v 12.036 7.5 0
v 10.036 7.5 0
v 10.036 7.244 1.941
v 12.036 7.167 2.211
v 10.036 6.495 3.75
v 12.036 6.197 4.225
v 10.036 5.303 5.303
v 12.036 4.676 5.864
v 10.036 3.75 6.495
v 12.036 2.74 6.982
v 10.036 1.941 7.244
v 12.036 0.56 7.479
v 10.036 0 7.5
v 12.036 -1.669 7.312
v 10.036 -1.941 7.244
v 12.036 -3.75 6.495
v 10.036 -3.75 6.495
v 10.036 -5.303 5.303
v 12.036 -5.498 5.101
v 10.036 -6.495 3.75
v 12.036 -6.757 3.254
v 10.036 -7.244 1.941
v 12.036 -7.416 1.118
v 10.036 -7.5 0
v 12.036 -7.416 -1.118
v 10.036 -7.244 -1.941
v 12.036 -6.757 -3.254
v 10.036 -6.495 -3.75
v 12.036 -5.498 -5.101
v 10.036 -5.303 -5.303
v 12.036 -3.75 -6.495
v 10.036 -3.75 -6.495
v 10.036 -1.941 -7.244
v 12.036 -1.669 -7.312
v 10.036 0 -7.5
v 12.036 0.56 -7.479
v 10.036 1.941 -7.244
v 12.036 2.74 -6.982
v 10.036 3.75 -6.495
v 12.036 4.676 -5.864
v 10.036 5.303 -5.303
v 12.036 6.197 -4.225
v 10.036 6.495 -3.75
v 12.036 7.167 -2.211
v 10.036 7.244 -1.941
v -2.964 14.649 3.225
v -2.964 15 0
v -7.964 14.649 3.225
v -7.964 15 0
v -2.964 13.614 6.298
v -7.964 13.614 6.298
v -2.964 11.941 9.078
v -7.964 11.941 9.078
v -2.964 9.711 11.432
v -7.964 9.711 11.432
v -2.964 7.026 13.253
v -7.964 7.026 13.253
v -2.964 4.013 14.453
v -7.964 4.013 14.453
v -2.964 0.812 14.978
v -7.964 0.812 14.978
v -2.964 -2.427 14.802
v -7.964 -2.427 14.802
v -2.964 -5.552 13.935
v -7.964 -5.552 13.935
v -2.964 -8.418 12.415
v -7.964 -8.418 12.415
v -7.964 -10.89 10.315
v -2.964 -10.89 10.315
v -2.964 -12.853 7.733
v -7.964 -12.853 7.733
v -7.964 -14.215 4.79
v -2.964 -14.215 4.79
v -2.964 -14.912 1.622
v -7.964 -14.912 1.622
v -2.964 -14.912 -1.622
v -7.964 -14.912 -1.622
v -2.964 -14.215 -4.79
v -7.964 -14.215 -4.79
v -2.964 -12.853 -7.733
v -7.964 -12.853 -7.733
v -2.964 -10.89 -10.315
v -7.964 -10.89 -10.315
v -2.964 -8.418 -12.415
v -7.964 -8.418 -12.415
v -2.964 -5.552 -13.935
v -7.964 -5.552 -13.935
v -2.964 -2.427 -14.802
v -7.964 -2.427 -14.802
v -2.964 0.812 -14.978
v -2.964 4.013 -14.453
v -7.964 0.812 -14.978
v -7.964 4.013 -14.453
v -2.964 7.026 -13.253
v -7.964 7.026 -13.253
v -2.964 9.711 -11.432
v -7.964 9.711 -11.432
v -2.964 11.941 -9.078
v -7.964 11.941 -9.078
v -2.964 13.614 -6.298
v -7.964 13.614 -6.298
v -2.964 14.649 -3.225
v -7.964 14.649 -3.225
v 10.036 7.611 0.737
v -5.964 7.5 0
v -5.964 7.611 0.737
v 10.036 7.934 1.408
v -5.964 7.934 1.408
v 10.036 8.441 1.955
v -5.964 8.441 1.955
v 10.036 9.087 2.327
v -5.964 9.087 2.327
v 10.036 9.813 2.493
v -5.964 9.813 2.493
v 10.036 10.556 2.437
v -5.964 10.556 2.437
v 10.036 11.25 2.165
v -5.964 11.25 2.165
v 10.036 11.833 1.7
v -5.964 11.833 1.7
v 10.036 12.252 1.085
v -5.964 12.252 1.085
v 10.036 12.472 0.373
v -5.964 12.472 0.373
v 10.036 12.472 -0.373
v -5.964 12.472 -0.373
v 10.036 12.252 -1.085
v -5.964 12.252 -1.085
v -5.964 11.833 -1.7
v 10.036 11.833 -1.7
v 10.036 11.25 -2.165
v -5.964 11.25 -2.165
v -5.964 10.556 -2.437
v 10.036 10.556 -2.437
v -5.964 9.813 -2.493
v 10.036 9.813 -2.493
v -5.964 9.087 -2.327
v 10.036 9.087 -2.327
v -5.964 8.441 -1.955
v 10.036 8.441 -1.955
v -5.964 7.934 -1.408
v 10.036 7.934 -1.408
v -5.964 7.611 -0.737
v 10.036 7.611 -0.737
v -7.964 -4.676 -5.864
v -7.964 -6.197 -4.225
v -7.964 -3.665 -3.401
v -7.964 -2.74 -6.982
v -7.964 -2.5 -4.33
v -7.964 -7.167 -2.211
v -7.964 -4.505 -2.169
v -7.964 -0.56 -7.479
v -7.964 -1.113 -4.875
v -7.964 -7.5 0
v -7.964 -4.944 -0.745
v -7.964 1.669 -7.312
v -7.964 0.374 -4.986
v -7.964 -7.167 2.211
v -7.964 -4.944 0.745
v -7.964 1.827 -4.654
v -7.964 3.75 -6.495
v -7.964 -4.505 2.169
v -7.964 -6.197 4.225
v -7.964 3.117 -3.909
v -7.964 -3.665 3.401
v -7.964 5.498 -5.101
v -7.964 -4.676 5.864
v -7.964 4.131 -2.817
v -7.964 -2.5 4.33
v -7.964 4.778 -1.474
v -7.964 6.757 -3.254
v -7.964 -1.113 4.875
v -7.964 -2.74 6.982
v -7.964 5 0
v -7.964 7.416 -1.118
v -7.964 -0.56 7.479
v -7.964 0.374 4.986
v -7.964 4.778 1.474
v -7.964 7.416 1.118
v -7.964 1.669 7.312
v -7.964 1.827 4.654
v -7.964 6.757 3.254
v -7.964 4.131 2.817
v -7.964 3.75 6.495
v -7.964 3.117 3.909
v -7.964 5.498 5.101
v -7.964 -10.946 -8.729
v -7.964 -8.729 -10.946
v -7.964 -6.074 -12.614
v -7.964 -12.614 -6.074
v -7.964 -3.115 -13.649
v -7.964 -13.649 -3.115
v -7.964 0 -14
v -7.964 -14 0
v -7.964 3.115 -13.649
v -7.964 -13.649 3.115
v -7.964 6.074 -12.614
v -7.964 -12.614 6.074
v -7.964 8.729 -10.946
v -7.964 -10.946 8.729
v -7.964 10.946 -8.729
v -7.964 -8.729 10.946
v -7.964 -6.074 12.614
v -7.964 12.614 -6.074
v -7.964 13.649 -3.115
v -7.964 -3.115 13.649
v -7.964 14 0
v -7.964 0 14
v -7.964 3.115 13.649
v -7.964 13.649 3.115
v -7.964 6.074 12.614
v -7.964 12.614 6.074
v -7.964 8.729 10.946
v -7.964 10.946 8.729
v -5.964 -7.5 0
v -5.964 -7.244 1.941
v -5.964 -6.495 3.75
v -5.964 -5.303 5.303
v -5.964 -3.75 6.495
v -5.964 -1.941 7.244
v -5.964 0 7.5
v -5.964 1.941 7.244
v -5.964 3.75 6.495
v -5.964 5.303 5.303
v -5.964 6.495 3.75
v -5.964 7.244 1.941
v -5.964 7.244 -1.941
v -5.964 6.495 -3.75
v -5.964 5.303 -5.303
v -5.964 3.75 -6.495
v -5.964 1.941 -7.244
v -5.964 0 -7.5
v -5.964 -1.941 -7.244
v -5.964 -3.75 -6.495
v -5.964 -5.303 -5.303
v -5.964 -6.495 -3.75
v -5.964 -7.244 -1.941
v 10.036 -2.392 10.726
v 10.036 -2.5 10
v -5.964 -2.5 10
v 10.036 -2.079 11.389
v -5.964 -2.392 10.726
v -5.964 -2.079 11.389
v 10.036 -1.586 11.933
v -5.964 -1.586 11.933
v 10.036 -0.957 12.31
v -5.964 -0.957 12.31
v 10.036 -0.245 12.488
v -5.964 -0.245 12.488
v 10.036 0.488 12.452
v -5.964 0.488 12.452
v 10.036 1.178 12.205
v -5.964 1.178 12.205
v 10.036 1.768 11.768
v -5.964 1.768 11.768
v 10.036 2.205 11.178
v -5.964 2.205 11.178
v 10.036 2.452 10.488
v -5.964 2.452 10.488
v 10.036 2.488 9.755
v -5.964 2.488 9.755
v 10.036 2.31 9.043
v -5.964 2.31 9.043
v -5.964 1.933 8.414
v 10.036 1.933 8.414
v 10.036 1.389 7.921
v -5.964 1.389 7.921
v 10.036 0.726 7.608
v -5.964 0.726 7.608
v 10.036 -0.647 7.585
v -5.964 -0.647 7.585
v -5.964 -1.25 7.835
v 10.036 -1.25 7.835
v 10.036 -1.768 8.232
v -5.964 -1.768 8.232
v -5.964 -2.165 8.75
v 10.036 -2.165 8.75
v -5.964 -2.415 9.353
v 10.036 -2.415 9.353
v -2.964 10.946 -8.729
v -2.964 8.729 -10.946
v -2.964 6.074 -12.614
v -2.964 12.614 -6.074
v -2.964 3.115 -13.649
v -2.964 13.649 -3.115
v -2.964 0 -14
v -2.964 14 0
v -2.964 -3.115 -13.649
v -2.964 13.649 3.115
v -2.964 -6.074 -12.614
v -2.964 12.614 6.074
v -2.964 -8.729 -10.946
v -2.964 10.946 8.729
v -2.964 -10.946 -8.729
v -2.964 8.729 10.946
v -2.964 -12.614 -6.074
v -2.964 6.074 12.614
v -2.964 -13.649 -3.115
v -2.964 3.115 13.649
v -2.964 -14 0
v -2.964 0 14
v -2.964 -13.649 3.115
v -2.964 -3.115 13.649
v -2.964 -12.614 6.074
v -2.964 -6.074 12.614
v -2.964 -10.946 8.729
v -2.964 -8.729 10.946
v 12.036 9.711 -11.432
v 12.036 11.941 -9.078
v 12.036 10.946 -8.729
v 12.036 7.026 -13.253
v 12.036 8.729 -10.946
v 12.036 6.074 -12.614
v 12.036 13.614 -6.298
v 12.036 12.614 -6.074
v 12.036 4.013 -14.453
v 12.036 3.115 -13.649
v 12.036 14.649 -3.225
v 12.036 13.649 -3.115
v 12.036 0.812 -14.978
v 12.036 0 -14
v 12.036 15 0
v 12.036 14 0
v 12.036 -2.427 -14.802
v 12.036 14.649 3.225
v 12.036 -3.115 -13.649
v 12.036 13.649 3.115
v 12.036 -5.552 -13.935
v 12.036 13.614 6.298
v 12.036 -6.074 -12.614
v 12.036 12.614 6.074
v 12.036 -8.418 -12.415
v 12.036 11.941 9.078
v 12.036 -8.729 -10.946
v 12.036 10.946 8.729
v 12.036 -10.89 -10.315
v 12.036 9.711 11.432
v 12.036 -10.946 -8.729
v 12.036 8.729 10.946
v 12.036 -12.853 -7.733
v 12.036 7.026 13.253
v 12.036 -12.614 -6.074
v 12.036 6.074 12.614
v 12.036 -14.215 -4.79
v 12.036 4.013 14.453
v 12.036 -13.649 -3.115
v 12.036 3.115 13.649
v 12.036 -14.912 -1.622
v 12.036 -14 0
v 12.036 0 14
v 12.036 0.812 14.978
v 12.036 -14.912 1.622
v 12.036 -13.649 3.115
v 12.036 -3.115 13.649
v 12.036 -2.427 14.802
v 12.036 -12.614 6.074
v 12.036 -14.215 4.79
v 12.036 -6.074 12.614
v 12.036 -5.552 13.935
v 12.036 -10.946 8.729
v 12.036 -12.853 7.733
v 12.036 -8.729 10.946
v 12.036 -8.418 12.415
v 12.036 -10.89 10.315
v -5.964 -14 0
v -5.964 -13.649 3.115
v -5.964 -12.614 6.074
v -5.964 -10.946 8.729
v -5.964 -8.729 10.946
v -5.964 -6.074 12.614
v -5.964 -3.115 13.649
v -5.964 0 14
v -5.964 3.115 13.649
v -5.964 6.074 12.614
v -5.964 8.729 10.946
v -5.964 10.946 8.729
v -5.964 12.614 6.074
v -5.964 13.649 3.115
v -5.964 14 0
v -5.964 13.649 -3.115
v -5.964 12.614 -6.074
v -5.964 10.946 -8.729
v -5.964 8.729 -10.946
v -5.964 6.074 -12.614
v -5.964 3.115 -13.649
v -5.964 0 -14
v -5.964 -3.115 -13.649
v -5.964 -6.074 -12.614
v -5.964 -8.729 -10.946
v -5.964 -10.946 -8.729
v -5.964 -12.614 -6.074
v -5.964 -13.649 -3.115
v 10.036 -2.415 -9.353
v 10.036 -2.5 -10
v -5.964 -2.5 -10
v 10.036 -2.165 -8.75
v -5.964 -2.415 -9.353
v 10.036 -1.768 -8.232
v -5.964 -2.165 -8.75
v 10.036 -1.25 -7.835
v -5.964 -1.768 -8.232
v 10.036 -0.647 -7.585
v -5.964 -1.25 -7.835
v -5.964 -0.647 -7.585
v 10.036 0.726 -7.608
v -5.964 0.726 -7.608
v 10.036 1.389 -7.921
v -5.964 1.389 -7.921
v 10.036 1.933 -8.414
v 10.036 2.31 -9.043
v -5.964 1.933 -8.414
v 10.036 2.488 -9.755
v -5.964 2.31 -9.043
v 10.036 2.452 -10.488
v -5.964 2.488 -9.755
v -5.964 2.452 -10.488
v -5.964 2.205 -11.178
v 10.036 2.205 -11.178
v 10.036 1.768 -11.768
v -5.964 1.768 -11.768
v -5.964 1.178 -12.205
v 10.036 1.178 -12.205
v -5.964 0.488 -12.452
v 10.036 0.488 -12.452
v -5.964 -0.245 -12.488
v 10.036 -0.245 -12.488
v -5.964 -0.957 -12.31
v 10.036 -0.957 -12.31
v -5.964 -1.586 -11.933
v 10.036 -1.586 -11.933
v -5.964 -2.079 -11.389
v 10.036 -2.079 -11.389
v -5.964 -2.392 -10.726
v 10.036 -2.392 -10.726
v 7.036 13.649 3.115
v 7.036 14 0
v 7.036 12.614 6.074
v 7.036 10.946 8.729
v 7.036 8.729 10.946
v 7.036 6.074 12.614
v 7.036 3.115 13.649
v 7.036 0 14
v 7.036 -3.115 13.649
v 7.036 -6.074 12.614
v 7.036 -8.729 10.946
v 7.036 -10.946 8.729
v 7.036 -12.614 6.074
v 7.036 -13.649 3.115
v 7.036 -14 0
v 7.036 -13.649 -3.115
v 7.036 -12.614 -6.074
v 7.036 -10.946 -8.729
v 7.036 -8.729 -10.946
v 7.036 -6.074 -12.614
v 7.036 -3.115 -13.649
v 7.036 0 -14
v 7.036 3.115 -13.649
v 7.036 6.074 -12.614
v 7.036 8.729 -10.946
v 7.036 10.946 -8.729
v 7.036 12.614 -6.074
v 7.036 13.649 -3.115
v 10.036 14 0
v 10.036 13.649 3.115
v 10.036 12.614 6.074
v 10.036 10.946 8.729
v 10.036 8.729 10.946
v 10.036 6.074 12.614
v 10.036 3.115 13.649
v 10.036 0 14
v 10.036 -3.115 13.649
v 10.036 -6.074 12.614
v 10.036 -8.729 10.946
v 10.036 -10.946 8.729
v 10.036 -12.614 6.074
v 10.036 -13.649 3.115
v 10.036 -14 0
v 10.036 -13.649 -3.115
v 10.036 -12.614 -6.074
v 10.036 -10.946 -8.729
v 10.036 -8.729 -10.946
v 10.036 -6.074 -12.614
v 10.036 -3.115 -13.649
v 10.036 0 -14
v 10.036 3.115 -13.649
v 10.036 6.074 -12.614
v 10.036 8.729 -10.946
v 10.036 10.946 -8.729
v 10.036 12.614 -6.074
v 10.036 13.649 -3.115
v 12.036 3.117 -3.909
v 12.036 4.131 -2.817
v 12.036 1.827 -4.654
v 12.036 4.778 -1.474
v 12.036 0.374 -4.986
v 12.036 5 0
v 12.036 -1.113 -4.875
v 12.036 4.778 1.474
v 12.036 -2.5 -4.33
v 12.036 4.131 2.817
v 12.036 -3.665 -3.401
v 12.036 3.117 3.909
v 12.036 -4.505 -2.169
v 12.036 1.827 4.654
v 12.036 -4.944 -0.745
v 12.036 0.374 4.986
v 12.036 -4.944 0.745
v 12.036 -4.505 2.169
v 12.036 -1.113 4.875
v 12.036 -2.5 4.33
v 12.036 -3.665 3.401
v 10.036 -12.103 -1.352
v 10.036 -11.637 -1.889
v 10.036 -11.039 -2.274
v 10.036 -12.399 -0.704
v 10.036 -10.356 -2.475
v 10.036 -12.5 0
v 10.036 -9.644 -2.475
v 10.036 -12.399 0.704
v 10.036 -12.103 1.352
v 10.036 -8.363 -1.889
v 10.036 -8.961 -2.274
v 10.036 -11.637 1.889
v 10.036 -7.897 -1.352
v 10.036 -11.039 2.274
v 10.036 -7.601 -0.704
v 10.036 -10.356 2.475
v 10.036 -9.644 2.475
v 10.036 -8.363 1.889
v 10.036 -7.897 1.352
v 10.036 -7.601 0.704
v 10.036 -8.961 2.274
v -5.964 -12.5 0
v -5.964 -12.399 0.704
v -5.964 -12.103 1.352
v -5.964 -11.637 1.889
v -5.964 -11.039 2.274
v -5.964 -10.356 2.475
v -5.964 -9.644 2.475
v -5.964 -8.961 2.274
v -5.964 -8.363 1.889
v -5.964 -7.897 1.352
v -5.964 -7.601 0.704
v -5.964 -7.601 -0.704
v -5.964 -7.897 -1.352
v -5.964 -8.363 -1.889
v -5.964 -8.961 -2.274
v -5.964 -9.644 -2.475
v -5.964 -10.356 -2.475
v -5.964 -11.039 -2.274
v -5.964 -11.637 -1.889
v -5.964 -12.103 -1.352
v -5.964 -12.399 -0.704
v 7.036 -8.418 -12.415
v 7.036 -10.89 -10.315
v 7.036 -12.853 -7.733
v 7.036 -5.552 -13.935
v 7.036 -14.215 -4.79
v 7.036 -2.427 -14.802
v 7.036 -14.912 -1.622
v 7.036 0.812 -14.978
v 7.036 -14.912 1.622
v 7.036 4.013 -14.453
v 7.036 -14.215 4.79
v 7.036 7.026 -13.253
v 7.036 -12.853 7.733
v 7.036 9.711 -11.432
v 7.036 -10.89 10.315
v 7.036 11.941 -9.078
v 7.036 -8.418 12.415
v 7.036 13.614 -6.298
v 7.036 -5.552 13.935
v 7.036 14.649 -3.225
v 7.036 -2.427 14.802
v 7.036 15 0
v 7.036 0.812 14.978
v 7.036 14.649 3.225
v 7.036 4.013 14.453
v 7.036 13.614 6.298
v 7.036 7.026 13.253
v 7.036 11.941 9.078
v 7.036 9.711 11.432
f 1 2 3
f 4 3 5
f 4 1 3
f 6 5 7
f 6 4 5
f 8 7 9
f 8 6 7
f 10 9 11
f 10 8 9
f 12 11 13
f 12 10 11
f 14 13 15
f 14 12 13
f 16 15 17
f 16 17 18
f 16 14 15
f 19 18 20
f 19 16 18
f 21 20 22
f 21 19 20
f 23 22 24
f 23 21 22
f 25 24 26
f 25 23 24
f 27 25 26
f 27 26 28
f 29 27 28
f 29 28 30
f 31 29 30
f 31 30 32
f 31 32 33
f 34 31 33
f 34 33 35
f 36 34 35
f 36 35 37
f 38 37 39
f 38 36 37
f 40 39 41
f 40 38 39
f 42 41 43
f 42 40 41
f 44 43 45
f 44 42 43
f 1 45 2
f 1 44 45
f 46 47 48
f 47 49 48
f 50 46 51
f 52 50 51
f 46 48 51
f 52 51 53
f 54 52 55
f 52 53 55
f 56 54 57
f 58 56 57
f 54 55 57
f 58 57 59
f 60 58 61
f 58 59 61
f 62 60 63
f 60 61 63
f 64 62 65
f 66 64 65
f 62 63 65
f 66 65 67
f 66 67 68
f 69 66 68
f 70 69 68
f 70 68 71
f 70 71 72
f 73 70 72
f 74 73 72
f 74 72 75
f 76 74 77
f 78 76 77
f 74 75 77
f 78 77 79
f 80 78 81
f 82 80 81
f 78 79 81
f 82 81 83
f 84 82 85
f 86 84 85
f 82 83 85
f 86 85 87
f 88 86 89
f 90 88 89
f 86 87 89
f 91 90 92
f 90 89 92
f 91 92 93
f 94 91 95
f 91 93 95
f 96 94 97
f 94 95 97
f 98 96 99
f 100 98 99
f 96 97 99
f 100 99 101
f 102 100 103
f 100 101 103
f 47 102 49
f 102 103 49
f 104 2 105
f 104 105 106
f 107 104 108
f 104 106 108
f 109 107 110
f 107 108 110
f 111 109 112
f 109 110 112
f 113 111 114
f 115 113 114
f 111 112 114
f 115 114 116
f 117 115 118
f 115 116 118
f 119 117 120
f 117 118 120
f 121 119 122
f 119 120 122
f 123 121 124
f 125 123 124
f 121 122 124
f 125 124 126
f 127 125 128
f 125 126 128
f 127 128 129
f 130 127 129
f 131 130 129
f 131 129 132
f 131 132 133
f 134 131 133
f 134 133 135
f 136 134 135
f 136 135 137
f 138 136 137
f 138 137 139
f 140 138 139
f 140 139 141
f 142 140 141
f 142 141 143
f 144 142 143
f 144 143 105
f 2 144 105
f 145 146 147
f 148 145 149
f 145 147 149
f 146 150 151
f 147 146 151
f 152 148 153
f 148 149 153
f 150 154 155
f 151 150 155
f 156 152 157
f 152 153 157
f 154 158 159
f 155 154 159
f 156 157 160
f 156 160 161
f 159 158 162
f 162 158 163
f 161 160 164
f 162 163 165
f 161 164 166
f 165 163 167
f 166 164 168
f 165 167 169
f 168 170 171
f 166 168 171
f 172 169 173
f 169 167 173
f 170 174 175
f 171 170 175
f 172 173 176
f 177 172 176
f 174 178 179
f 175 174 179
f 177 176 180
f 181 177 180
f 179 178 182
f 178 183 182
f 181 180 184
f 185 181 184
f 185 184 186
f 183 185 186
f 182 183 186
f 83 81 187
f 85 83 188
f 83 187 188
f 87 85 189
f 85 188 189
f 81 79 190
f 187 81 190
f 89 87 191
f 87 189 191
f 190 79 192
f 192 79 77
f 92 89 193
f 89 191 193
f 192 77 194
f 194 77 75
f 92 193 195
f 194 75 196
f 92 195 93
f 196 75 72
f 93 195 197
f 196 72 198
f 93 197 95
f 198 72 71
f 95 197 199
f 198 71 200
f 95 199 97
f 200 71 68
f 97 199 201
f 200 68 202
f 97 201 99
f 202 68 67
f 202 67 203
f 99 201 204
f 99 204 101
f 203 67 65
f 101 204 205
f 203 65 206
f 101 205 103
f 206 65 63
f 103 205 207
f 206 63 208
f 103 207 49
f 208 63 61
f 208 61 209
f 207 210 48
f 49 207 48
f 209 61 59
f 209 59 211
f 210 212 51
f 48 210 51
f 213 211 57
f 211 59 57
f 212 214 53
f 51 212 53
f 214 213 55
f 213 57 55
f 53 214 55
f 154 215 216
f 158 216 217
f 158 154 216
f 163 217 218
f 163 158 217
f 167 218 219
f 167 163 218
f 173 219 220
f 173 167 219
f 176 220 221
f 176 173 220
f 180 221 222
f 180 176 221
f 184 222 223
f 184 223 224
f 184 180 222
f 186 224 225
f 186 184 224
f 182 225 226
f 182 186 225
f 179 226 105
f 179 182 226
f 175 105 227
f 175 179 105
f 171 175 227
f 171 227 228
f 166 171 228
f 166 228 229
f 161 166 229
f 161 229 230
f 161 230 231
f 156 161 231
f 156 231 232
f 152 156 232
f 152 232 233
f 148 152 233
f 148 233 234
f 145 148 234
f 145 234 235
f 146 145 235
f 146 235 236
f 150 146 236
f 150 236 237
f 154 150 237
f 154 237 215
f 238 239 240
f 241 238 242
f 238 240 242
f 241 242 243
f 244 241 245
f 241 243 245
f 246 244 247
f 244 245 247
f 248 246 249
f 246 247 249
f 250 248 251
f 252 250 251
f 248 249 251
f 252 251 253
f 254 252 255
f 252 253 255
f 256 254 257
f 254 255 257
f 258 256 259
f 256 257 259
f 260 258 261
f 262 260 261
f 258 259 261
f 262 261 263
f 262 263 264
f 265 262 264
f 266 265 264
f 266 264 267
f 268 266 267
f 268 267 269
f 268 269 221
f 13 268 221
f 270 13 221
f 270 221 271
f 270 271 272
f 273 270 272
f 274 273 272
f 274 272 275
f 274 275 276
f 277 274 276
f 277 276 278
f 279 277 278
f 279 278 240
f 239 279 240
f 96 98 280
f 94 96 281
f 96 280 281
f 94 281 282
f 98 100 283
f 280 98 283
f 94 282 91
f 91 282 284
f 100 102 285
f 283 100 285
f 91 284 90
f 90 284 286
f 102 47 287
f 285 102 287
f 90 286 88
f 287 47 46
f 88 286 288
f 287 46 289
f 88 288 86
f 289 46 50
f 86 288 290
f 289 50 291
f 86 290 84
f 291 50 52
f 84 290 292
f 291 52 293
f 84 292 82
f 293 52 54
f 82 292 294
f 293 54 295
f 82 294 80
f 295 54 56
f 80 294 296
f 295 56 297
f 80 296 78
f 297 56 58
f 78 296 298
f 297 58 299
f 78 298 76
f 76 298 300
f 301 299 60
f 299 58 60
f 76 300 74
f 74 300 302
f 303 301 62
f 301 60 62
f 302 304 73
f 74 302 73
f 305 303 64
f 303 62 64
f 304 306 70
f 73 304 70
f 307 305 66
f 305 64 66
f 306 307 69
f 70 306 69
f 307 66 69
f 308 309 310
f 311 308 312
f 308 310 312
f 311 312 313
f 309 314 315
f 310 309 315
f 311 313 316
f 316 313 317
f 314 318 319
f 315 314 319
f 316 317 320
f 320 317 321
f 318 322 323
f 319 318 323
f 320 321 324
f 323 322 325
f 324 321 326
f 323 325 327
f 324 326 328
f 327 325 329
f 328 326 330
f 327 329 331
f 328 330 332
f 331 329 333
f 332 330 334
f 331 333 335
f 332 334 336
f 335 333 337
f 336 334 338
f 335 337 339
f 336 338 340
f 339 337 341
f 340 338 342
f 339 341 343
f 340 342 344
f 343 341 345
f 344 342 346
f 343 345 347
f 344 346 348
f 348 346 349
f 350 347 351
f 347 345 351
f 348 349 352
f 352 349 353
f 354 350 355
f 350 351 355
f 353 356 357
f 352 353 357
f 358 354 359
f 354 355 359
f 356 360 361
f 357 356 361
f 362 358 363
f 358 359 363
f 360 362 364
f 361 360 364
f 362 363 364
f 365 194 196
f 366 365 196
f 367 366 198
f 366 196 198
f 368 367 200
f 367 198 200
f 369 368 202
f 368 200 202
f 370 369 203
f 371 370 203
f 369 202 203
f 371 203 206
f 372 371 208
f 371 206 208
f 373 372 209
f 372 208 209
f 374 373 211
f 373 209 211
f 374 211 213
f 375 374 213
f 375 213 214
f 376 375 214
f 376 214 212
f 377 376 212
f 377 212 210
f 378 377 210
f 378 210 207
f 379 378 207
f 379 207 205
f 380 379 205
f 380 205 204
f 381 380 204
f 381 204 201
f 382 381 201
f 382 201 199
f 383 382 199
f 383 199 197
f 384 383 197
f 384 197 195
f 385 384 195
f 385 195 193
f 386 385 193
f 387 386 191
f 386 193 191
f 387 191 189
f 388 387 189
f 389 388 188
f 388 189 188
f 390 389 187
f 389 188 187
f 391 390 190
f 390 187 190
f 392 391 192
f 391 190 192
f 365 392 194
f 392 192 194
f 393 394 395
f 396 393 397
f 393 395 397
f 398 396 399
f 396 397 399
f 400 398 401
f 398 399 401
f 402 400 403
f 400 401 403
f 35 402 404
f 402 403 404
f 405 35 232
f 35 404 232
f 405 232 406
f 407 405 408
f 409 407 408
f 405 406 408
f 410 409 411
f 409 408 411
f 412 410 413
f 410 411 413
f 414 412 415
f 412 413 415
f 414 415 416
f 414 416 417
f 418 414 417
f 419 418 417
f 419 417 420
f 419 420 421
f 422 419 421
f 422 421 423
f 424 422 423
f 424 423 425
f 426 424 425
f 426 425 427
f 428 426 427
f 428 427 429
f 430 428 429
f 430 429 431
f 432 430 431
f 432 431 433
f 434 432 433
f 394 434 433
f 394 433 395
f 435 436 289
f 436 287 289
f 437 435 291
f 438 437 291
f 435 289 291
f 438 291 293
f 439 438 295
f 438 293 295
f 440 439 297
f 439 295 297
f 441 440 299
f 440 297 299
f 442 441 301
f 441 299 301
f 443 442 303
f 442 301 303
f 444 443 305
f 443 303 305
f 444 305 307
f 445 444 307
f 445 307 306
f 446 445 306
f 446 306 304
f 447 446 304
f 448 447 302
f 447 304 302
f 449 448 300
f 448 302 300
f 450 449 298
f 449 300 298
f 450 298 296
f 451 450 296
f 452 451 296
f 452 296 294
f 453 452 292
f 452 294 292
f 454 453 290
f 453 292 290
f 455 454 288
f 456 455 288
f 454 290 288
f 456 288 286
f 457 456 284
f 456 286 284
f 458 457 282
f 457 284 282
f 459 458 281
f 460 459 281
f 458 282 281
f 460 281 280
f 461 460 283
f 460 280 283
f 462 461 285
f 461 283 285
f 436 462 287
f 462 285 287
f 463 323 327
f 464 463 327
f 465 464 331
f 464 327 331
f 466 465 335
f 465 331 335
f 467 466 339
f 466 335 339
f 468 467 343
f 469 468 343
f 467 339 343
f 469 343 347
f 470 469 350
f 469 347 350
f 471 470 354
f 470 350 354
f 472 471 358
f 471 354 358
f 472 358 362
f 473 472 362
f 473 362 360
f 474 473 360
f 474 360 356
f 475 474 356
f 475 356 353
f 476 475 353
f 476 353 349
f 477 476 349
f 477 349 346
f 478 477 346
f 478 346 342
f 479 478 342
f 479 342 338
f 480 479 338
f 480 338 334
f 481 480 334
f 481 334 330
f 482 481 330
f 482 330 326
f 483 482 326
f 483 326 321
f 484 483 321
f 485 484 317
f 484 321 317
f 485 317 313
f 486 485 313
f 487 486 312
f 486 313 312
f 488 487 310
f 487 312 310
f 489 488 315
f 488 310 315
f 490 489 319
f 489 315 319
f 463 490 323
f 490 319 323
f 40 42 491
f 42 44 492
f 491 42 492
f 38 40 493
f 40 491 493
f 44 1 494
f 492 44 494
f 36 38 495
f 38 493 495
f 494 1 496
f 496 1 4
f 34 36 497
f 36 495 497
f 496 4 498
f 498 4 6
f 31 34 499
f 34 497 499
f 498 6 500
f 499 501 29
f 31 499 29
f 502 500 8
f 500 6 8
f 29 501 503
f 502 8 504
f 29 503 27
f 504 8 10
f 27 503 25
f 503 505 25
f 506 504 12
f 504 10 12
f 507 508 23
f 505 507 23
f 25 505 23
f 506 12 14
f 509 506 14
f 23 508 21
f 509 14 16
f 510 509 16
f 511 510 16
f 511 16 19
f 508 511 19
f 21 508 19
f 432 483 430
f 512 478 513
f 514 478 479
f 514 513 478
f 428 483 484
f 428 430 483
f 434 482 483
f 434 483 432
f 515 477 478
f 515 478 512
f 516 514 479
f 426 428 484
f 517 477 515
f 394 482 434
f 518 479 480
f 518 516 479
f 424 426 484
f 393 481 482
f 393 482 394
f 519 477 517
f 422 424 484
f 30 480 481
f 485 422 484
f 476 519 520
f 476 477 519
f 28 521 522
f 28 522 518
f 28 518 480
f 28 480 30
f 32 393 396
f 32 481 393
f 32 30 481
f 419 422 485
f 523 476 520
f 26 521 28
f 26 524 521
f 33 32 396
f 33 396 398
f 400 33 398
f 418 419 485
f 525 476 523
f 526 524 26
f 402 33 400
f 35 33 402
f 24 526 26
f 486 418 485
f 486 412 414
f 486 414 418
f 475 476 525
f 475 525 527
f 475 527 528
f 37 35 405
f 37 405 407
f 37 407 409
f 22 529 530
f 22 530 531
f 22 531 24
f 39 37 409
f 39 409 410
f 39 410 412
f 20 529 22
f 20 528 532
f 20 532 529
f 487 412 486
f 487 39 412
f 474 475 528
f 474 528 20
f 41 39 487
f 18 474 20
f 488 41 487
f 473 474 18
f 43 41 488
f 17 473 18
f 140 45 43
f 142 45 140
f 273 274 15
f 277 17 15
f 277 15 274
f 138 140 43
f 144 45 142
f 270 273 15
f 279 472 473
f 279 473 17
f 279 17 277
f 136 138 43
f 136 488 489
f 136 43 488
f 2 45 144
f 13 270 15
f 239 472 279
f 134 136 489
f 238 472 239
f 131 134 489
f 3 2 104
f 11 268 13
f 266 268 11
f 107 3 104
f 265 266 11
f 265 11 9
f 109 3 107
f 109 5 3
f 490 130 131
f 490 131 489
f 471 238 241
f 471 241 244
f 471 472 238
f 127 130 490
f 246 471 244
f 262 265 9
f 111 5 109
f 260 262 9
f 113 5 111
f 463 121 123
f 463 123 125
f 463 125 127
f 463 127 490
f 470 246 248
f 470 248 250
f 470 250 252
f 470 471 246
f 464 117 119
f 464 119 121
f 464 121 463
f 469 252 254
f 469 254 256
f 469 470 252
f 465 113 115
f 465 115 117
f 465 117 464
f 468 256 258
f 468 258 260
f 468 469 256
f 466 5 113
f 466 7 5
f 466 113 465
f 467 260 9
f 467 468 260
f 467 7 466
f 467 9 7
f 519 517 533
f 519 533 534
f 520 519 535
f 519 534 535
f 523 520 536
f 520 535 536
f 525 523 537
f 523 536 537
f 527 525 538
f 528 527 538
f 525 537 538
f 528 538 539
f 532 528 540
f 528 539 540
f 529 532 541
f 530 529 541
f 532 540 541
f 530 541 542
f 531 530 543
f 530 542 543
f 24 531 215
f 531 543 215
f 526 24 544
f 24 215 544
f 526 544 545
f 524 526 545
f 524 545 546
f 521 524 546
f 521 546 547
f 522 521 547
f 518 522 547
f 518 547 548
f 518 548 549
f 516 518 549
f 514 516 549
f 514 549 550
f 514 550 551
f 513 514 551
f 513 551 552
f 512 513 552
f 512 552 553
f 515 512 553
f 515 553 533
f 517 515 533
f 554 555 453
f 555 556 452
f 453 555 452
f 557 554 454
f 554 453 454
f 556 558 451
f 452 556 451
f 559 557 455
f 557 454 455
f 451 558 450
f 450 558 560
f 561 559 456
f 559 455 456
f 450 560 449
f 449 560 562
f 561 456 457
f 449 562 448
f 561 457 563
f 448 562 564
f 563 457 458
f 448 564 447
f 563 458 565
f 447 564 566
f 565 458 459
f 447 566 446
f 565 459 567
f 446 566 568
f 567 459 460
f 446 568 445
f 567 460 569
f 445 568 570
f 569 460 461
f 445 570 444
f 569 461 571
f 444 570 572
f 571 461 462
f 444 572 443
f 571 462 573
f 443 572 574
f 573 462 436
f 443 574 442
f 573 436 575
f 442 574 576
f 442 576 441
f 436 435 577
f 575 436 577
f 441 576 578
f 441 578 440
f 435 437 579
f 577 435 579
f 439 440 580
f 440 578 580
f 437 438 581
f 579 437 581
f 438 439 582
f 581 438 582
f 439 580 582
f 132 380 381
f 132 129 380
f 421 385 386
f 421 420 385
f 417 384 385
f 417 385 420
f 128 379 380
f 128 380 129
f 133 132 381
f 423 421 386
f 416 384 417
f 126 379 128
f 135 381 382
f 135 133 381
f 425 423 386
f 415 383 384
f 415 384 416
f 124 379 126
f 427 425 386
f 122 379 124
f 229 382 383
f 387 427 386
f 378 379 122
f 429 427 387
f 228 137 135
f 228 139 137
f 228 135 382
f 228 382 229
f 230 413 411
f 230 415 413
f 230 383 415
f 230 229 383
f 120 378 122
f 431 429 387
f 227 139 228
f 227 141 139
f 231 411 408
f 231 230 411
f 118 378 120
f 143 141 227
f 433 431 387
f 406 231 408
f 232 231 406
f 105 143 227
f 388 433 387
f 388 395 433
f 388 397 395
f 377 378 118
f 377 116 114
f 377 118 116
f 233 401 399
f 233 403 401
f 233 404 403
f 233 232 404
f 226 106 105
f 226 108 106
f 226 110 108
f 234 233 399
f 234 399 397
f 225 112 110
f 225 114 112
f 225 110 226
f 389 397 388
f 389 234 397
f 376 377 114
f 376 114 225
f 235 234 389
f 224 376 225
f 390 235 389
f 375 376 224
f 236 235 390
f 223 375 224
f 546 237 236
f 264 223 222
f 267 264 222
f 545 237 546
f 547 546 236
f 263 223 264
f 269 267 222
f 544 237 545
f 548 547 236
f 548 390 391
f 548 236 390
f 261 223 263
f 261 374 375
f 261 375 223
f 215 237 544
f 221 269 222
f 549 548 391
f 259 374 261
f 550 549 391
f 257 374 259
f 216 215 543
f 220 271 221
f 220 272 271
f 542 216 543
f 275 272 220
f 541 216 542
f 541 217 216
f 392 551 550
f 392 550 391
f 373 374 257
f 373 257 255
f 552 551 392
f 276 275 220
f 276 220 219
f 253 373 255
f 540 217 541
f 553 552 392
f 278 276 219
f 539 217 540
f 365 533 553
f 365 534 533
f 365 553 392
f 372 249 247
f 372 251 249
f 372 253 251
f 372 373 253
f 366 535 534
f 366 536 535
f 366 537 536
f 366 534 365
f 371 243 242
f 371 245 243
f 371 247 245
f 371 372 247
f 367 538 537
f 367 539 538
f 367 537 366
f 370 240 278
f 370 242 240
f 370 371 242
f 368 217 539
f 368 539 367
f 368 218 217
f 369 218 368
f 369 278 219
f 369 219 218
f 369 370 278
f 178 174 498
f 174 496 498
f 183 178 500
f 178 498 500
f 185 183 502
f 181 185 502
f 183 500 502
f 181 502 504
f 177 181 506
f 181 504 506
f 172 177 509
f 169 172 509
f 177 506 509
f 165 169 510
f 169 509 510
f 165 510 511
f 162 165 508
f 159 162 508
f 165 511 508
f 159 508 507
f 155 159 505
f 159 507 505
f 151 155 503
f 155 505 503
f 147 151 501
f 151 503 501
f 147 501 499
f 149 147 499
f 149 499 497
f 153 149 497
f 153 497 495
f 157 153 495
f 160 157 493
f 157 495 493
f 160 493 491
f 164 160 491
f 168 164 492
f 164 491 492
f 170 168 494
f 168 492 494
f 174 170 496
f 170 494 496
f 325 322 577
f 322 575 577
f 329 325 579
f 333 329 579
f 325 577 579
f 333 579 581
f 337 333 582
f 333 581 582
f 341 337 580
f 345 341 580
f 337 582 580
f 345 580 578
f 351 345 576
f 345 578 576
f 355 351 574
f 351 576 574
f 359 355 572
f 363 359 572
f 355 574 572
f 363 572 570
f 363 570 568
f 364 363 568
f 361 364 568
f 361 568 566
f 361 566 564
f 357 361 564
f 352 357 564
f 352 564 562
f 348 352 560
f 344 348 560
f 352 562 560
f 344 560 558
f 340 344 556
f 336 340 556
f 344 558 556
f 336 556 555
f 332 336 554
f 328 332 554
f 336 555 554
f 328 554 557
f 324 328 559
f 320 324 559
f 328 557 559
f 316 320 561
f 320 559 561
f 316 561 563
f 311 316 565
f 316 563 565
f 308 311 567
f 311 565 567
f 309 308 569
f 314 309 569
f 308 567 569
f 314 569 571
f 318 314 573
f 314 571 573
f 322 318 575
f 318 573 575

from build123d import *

# Parameters (mm, degrees)
F2_R     = 2.5
F3_DEPTH = 20.001
F5_R     = 14
F5_R_2   = 7.5
F6_DEPTH = 3
F8_R     = 14
F8_R_2   = 7.5
F9_DEPTH = 3


with BuildPart() as f1:
    # F0 (on Top) → F1 (revolve)
    with BuildSketch(Plane.XY):
        Polygon((12.0361039788, 5), (12.0361039788, 15), (7.0361039788, 15), (7.0361039788, 14), (-2.9638960212, 14), (-2.9638960212, 15), (-7.9638960212, 15), (-7.9638960212, 5), align=None)
    revolve(axis=Axis((-2.1188026294, 0, 0), (1, 0, 0)))

    # F2 (on face) → F3 (cut, through all)
    with BuildSketch(Plane(origin=(-7.9638960212, 0, 0), x_dir=(0, -1, 0), z_dir=(-1, 0, 0))):
        with Locations((-10, 0)):
            Circle(F2_R)
        with Locations((10, 0)):
            Circle(F2_R)
        with Locations((0, 10)):
            Circle(F2_R)
        with Locations((0, -10)):
            Circle(F2_R)
    extrude(amount=-F3_DEPTH, mode=Mode.SUBTRACT)

    # F5 (on offset) → F6 (cut)
    with BuildSketch(Plane(origin=(-8.9638960212, 0, 0), x_dir=(0, -1, 0), z_dir=(-1, 0, 0))):
        Circle(F5_R)
        Circle(F5_R_2, mode=Mode.SUBTRACT)
    extrude(amount=-F6_DEPTH, mode=Mode.SUBTRACT)

    # F8 (on offset) → F9 (cut)
    with BuildSketch(Plane.YZ.offset(13.0361039788)):
        Circle(F8_R)
        Circle(F8_R_2, mode=Mode.SUBTRACT)
    extrude(amount=-F9_DEPTH, mode=Mode.SUBTRACT)


solid = f1.part
